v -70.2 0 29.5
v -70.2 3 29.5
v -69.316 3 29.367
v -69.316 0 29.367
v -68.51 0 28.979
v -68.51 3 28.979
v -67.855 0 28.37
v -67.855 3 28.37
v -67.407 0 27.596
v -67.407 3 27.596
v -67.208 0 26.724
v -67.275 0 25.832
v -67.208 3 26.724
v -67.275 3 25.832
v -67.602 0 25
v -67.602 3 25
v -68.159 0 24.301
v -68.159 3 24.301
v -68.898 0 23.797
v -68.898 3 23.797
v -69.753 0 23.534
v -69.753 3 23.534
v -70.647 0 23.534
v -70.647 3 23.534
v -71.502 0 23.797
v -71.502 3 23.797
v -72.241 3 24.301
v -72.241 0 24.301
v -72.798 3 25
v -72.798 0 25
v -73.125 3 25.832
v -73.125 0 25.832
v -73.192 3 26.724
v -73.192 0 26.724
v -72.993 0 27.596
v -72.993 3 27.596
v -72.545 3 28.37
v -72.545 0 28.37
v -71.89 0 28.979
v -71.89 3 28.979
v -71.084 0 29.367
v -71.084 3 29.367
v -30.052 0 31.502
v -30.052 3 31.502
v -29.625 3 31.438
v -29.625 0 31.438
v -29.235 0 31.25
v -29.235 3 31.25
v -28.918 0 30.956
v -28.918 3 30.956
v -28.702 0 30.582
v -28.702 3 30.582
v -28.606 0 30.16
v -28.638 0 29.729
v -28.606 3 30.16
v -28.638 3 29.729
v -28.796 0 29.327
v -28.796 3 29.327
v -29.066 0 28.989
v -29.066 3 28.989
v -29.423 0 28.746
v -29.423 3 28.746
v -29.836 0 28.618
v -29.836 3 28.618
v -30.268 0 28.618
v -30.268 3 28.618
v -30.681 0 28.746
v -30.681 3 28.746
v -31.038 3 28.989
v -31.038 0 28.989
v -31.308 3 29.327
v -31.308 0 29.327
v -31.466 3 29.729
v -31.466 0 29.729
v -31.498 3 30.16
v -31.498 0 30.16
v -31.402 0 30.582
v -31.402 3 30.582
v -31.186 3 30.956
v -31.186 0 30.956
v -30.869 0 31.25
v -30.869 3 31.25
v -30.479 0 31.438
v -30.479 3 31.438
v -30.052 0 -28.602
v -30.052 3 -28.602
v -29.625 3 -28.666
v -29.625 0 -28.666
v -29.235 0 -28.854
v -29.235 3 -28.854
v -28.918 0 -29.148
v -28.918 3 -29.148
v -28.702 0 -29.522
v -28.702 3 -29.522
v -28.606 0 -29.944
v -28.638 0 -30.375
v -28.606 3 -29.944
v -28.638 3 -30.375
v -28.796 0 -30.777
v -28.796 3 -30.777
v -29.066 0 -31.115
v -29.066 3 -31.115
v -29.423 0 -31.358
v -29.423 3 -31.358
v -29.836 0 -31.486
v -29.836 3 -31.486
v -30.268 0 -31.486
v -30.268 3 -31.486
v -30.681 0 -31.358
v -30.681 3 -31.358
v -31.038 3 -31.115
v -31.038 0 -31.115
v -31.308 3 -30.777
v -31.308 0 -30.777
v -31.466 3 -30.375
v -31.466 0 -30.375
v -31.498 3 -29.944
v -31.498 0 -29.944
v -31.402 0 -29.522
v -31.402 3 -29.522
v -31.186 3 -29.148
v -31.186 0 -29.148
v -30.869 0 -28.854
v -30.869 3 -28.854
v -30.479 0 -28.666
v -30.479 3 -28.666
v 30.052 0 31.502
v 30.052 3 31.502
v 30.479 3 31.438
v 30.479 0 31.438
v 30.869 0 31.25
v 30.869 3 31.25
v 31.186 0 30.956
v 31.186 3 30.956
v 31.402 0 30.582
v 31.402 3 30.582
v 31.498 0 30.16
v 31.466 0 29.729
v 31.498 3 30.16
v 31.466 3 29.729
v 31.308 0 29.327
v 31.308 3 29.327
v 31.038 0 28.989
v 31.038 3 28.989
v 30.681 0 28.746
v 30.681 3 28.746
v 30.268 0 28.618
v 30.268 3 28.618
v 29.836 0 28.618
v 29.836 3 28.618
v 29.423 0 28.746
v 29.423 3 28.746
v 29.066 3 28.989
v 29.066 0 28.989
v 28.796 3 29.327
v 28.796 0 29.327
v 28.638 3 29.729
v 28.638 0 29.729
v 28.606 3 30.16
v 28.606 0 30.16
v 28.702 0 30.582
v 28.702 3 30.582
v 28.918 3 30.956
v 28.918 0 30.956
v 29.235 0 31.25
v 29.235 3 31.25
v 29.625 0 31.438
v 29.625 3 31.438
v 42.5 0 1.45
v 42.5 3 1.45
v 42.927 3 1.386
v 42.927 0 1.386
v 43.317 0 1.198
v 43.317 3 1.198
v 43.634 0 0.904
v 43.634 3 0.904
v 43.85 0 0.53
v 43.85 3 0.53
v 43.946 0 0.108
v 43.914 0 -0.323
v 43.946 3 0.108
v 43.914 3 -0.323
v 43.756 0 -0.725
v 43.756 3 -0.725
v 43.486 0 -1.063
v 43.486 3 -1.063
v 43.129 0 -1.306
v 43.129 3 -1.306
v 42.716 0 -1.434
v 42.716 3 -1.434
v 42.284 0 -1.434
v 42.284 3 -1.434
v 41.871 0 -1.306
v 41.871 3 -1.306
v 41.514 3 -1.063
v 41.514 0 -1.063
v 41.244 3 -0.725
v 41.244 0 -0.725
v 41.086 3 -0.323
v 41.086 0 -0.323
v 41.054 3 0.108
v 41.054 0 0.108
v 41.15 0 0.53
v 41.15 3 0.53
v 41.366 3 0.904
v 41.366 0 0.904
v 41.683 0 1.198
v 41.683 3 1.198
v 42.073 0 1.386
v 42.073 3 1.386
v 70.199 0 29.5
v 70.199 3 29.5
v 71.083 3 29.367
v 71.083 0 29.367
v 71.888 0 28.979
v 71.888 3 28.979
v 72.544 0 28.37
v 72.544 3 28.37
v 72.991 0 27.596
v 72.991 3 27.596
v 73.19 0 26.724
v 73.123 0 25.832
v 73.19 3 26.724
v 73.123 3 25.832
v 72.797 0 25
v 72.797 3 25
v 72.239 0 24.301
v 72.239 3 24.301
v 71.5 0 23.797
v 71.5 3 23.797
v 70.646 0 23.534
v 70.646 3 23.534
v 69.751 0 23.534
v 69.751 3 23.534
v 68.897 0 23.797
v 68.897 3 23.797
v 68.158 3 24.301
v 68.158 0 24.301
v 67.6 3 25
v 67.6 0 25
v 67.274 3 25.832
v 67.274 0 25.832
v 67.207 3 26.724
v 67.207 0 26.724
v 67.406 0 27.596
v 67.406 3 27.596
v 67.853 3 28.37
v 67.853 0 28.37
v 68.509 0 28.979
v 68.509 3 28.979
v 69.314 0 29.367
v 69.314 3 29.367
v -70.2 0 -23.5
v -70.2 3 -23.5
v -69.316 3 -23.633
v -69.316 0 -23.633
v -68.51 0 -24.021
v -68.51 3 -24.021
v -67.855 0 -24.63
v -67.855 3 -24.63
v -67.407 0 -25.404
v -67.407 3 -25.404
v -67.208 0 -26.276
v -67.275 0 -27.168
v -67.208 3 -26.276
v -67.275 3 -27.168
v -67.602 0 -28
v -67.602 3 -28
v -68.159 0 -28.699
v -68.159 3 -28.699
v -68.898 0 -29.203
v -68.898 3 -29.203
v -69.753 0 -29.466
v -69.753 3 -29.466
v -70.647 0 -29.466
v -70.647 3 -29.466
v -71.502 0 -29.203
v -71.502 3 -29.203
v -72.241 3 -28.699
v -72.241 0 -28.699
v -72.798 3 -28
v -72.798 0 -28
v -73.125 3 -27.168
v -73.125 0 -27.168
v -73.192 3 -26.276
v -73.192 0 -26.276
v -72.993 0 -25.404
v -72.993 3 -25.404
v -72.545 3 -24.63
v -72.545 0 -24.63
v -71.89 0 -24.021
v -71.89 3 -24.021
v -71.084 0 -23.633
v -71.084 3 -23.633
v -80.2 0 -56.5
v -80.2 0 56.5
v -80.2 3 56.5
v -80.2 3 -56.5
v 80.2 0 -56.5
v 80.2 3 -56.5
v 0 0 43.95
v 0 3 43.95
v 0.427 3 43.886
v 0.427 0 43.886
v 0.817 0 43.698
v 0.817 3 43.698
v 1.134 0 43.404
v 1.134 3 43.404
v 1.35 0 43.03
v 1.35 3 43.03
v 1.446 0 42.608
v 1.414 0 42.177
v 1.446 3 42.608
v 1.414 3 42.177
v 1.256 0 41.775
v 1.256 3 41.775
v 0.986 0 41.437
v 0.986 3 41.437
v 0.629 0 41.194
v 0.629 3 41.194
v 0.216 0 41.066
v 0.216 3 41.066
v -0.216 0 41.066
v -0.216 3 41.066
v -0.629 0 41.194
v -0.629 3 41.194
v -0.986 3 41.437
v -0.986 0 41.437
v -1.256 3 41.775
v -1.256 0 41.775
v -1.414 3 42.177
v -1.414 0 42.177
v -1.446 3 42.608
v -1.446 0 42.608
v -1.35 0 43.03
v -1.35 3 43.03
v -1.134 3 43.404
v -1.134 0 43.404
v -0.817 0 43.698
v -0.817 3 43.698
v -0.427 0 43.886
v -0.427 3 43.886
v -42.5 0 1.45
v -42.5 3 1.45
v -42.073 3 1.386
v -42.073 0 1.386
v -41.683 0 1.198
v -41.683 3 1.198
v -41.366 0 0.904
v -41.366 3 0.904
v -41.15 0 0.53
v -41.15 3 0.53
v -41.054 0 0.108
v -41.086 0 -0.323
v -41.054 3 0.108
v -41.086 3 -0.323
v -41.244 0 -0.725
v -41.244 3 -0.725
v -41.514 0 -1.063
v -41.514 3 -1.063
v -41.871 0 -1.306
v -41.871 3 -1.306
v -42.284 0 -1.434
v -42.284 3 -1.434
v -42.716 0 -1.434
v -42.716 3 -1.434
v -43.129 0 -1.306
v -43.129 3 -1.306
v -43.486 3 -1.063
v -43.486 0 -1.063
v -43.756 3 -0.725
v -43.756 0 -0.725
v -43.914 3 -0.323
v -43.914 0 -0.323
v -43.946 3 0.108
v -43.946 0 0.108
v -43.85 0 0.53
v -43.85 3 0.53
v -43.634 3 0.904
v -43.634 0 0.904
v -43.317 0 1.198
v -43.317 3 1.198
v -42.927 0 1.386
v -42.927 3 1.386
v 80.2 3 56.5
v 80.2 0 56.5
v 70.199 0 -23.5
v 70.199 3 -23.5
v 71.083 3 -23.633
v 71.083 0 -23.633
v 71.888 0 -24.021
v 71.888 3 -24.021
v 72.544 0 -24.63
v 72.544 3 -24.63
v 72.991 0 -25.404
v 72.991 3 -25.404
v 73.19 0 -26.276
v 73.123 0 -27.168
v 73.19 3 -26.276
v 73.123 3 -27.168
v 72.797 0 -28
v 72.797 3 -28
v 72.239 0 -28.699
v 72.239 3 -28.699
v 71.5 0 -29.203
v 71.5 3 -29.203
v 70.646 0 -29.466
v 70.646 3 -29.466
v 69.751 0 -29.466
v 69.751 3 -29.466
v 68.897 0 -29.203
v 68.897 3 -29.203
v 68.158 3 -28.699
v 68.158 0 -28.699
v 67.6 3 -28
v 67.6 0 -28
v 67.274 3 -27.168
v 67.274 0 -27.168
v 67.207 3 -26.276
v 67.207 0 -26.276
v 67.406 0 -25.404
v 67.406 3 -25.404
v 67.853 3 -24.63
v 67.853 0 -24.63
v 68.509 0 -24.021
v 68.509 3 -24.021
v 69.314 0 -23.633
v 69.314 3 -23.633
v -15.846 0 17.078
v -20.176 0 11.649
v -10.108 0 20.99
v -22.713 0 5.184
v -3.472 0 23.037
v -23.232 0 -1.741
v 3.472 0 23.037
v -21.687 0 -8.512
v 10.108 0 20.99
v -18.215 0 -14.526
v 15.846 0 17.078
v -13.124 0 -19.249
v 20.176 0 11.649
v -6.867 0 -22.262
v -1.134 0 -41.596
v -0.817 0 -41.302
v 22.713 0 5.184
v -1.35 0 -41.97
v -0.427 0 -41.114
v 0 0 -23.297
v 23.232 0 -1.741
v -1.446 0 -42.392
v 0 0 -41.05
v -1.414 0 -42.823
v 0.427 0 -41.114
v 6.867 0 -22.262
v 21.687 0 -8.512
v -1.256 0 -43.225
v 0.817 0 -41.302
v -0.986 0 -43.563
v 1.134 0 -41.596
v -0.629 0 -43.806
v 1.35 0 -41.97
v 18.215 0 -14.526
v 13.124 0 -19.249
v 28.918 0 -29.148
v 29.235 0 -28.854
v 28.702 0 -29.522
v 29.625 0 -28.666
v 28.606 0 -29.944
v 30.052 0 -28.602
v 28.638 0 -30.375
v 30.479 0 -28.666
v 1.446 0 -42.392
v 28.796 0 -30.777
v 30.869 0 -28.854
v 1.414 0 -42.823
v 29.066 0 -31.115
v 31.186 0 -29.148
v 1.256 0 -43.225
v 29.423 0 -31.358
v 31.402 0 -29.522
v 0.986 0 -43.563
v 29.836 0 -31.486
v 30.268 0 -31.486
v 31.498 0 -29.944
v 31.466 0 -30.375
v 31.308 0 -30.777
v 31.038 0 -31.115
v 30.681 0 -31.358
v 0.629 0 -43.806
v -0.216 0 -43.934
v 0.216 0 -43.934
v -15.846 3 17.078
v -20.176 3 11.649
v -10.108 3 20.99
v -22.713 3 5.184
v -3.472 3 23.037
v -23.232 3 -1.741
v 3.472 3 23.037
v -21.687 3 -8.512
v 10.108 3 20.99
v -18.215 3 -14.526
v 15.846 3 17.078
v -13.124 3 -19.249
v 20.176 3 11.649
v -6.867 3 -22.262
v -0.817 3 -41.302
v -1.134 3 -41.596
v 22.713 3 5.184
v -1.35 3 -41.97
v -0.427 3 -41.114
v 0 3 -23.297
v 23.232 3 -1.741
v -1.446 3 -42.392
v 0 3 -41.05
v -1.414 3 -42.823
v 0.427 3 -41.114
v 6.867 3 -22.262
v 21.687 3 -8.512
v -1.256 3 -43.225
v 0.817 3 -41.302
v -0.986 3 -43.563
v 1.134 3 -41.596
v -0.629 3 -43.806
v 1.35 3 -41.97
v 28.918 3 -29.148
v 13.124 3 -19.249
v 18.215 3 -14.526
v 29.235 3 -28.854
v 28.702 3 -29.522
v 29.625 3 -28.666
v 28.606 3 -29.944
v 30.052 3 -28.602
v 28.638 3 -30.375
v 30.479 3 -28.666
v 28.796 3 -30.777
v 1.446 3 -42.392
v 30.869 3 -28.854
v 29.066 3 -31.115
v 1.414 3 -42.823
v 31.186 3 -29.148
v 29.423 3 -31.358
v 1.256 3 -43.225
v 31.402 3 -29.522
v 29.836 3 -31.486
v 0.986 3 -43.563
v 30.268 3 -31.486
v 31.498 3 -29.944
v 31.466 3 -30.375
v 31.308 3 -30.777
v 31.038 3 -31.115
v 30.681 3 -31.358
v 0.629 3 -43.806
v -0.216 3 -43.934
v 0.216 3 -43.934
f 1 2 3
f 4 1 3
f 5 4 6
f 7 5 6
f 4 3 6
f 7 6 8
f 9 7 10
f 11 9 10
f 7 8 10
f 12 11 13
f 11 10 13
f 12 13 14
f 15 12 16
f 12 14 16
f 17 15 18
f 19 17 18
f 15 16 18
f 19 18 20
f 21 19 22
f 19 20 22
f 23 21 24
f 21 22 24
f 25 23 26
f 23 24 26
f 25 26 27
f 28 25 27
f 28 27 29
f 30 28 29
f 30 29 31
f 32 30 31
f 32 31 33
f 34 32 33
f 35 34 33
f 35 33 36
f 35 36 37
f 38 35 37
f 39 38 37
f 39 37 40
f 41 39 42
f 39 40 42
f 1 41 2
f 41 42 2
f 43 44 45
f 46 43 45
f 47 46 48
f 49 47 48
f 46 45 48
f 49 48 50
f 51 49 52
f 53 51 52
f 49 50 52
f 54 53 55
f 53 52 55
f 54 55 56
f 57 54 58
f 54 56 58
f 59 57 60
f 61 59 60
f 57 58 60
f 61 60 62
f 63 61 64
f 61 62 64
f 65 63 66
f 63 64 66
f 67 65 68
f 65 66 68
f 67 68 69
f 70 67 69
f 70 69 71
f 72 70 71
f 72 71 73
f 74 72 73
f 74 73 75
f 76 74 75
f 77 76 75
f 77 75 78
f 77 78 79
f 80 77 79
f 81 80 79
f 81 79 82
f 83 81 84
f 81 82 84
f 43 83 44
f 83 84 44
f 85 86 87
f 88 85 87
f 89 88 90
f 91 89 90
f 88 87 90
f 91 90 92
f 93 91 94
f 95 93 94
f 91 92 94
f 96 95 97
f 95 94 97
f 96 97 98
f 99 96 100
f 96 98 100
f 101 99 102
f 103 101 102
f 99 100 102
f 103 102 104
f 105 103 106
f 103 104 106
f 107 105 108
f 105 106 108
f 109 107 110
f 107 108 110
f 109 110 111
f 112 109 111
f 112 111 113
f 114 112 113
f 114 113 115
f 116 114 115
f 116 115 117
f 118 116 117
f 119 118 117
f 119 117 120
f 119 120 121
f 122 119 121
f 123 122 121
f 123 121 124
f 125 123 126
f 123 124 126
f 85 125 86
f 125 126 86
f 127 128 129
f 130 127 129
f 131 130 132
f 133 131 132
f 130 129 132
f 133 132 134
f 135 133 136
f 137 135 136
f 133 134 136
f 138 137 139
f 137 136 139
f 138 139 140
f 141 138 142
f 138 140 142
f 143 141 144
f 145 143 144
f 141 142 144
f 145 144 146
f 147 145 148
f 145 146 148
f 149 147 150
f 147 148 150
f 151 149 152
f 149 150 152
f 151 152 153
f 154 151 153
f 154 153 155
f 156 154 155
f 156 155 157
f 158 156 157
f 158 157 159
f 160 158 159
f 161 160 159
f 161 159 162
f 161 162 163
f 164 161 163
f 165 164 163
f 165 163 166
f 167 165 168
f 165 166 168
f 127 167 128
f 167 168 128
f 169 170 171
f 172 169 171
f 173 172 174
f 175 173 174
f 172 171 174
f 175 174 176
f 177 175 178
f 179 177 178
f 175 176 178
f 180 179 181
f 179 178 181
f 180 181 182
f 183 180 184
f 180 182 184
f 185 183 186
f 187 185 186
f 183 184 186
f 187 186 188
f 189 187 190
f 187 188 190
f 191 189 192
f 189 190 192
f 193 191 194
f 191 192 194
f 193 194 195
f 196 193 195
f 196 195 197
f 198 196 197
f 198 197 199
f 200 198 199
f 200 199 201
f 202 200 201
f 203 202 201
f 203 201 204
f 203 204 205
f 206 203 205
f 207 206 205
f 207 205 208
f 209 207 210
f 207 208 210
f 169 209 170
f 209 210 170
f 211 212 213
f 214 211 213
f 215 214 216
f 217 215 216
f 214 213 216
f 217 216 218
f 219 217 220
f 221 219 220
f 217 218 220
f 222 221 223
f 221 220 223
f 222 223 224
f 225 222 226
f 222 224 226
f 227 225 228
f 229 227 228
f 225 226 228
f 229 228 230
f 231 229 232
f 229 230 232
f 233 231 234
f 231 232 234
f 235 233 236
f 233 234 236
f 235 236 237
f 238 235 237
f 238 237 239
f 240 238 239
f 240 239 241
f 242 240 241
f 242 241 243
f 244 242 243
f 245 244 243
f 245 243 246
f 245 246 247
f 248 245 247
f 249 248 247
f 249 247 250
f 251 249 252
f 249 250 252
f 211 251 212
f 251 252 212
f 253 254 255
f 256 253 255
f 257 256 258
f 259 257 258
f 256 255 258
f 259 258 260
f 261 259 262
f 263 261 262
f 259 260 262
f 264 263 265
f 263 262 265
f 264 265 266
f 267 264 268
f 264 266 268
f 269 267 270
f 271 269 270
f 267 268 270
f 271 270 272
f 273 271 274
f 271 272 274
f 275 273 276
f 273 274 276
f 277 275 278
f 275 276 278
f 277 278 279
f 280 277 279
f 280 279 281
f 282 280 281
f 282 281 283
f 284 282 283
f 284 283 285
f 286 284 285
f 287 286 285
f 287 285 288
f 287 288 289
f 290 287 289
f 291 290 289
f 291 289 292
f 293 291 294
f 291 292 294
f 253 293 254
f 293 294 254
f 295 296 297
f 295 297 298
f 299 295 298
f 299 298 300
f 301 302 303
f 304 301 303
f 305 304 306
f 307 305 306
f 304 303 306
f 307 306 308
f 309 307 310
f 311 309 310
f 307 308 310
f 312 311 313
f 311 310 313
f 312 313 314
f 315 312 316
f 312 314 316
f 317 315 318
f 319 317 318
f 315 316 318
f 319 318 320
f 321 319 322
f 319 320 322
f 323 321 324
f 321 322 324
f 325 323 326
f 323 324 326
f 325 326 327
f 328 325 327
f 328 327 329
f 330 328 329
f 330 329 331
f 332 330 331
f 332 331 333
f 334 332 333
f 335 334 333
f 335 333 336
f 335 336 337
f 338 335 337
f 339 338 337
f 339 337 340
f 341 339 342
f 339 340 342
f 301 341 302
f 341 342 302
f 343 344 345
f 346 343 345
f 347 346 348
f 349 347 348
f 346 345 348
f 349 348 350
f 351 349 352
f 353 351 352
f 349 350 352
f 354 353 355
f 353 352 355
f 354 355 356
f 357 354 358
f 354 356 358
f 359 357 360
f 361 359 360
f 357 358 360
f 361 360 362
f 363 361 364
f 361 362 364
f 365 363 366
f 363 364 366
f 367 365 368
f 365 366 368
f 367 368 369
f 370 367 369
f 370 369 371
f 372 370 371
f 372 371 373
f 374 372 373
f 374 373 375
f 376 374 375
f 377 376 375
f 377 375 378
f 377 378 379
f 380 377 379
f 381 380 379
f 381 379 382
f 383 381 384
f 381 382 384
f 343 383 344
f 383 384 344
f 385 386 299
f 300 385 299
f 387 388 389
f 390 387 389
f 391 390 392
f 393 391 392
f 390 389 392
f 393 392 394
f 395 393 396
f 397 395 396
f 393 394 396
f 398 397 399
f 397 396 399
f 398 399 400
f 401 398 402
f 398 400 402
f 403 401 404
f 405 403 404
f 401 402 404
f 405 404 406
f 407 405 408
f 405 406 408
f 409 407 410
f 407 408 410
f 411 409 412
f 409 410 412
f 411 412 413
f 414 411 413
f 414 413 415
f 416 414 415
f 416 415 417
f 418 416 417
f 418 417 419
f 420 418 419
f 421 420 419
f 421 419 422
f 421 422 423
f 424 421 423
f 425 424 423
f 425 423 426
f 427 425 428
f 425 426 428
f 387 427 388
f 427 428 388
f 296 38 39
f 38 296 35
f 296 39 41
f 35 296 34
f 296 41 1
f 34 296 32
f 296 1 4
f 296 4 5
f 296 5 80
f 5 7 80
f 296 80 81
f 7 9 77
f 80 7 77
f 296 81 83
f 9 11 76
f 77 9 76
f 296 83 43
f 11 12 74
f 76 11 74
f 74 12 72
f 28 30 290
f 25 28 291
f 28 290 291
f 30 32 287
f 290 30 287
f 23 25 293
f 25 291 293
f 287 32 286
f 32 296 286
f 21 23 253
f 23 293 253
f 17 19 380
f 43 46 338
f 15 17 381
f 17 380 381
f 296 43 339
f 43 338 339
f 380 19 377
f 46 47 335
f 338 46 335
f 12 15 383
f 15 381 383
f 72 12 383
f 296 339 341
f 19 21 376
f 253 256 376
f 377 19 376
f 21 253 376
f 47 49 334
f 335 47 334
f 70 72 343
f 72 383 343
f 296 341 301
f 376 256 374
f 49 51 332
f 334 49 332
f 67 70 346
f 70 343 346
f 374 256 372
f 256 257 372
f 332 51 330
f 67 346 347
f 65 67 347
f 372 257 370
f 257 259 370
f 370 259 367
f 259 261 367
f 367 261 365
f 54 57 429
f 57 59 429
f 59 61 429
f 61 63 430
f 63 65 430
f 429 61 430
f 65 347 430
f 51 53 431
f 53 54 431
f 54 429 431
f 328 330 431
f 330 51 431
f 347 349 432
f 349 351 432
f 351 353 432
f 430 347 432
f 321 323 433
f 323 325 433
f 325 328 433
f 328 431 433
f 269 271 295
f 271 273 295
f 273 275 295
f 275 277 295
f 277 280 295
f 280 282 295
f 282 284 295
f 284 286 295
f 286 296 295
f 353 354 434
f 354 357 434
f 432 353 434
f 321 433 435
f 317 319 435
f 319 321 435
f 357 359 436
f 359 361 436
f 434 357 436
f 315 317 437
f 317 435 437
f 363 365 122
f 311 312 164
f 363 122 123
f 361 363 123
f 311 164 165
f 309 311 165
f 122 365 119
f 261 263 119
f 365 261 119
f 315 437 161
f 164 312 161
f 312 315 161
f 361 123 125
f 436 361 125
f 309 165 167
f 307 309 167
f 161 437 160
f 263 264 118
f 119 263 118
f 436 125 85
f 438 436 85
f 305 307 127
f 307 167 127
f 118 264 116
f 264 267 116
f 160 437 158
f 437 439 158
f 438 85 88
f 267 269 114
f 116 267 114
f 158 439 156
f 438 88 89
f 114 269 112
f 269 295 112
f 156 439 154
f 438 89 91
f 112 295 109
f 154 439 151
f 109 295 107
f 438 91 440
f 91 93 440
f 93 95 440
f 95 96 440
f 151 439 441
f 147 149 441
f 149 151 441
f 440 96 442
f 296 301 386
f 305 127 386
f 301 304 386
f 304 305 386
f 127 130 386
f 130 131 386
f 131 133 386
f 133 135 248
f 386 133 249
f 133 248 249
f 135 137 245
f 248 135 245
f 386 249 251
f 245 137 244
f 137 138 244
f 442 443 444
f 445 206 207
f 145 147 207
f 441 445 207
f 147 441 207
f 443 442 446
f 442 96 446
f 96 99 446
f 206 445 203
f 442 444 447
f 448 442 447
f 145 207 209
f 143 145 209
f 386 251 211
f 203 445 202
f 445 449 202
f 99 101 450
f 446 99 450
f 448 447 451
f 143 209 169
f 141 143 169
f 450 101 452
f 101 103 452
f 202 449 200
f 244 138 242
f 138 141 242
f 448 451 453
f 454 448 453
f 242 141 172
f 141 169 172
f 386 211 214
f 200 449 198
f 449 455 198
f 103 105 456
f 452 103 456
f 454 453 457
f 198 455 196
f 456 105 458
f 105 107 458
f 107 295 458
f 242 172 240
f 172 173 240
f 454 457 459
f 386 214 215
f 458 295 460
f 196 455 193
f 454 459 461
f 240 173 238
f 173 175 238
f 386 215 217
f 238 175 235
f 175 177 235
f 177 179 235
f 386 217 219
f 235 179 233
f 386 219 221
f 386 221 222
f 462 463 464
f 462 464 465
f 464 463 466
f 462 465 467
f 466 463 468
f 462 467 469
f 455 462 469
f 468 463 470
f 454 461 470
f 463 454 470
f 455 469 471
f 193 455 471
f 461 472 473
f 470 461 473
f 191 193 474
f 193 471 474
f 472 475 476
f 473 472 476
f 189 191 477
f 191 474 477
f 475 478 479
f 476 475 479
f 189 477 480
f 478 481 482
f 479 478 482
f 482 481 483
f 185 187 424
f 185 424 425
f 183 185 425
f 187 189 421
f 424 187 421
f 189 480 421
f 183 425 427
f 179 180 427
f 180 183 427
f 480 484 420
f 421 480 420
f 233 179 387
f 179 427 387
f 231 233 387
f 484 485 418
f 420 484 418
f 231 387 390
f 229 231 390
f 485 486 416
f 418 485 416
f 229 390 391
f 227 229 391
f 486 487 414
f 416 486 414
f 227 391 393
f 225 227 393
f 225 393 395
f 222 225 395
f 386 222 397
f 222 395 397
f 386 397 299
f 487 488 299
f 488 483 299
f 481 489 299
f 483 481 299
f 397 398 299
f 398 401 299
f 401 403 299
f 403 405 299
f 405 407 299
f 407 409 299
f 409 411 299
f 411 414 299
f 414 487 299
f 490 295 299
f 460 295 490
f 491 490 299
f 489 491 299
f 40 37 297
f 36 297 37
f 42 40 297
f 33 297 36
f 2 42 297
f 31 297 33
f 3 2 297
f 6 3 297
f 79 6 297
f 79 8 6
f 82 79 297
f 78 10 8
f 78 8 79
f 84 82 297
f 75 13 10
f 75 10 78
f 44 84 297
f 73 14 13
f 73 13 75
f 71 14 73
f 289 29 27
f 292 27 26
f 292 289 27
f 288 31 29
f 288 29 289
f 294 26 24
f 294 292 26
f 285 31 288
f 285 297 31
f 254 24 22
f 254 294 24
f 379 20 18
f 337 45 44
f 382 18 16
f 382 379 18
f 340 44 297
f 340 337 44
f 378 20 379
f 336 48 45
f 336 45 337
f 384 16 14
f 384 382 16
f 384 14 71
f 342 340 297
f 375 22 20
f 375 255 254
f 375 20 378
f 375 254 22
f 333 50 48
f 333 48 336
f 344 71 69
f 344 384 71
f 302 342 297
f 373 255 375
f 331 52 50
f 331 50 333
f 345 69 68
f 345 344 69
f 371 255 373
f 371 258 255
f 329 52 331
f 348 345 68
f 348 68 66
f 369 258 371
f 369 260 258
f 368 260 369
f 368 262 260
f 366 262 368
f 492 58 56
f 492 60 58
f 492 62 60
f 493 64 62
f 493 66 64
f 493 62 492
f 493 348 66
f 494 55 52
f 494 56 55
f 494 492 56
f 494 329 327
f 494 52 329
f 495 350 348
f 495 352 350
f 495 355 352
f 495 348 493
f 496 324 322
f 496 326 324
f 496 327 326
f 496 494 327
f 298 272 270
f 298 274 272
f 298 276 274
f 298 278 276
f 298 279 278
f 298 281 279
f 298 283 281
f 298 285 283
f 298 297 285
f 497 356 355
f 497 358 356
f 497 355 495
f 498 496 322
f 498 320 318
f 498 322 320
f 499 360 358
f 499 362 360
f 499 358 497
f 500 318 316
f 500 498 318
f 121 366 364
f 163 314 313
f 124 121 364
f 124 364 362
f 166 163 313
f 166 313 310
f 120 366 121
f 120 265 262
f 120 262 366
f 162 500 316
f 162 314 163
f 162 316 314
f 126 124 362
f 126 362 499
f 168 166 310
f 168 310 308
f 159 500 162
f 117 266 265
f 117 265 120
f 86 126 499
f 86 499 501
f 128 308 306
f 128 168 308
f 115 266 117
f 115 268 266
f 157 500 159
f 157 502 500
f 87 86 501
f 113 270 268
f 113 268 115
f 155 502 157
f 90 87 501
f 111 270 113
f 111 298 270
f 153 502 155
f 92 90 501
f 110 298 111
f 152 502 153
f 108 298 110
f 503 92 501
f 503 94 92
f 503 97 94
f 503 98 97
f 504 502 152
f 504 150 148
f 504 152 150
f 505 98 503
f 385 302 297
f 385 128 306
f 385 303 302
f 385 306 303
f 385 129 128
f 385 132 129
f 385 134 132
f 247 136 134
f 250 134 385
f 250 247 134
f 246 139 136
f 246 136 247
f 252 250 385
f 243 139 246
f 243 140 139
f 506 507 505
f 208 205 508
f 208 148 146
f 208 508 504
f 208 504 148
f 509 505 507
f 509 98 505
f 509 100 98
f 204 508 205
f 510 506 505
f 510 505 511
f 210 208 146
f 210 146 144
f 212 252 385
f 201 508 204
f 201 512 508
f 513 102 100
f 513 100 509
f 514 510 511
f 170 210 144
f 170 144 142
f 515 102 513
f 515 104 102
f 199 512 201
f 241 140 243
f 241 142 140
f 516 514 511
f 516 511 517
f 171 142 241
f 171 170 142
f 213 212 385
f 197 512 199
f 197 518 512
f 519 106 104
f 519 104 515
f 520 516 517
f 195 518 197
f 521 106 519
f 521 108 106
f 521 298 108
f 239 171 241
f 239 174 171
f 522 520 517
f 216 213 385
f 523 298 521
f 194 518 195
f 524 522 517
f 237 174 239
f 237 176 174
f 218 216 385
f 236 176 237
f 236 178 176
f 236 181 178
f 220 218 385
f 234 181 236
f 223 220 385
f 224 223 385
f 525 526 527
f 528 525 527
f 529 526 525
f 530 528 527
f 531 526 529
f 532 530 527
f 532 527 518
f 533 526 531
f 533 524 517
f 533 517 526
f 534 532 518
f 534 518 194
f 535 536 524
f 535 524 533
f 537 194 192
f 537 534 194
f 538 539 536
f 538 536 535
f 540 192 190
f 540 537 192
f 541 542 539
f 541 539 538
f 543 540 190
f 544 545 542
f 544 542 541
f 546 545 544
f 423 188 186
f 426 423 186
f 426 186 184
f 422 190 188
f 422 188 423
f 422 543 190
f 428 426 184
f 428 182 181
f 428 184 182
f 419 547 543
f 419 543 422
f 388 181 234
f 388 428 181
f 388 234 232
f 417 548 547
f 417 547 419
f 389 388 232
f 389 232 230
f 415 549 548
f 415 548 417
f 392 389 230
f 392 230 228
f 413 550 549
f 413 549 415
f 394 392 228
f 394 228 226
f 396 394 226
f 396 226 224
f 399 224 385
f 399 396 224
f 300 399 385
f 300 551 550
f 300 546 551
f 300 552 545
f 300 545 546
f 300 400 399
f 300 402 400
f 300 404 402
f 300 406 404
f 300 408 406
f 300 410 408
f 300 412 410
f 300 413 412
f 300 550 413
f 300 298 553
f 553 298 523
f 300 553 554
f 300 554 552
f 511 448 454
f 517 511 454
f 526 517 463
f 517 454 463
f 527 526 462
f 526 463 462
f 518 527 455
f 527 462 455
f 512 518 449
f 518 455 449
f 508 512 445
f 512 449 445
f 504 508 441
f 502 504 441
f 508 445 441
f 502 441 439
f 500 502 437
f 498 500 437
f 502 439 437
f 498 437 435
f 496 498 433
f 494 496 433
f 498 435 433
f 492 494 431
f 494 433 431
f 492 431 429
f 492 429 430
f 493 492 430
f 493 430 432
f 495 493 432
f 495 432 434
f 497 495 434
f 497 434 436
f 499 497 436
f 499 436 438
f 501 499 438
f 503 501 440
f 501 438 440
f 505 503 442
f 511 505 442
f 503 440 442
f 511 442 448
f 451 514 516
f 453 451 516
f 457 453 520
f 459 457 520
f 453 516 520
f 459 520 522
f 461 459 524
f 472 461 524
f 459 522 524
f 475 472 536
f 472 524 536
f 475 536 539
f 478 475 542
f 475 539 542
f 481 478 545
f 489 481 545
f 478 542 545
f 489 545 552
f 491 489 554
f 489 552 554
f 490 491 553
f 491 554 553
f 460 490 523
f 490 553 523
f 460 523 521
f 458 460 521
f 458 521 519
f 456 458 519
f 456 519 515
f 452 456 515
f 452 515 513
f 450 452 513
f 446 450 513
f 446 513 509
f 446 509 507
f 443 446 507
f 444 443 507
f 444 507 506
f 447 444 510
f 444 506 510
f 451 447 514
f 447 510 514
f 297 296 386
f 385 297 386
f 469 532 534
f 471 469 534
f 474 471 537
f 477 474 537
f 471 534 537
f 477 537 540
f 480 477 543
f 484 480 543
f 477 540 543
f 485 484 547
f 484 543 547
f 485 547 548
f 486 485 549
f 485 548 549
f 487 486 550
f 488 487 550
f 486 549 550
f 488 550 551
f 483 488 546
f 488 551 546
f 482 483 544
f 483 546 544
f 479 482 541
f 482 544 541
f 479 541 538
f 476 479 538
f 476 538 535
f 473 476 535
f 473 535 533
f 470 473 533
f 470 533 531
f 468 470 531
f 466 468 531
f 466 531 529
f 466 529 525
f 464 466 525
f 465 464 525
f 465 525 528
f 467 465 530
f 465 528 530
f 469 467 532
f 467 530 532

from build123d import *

# Parameters (mm, degrees)
SKETCH_1_W          = 160.4
SKETCH_1_H          = 113
EXTRUDE_1_DEPTH     = 3
SKETCH_2_R          = 1.45
CUT_EXTRUDE_1_DEPTH = 3
SKETCH_3_R          = 23.297499696
CUT_EXTRUDE_2_DEPTH = 3
SKETCH_4_R          = 3
CUT_EXTRUDE_3_DEPTH = 3


with BuildPart() as part:
    # 草图1 → 凸台-拉伸1 (new body)
    with BuildSketch(Plane(origin=(0, 0, 0), x_dir=(1, 0, 0), z_dir=(0, 1, 0))):
        Rectangle(SKETCH_1_W, SKETCH_1_H)
    extrude(amount=EXTRUDE_1_DEPTH)

    # 草图2 → 切除-拉伸1 (cut)
    with BuildSketch(Plane(origin=(0, 3, 0), x_dir=(1, 0, 0), z_dir=(0, 1, 0))):
        with Locations(Location((0, -42.5, 0), (0, 0, 270))):
            Circle(SKETCH_2_R)
        with Locations(Location((-30.0520382, -30.0520382, 0), (0, 0, 270))):
            Circle(SKETCH_2_R)
        with Locations(Location((-42.5, 0, 0), (0, 0, 270))):
            Circle(SKETCH_2_R)
        with Locations(Location((-30.0520382, 30.0520382, 0), (0, 0, 270))):
            Circle(SKETCH_2_R)
        with Locations(Location((0, 42.5, 0), (0, 0, 270))):
            Circle(SKETCH_2_R)
        with Locations(Location((30.0520382, 30.0520382, 0), (0, 0, 270))):
            Circle(SKETCH_2_R)
        with Locations(Location((42.5, 0, 0), (0, 0, 270))):
            Circle(SKETCH_2_R)
        with Locations(Location((30.0520382, -30.0520382, 0), (0, 0, 270))):
            Circle(SKETCH_2_R)
    extrude(amount=-CUT_EXTRUDE_1_DEPTH, mode=Mode.SUBTRACT)

    # 草图3 → 切除-拉伸2 (cut)
    with BuildSketch(Plane.XZ):
        with Locations(Location((0, 0, 0), (0, 0, 270))):
            Circle(SKETCH_3_R)
    extrude(amount=-CUT_EXTRUDE_2_DEPTH, mode=Mode.SUBTRACT)

    # 草图4 → 切除-拉伸3 (cut)
    with BuildSketch(Plane(origin=(0, 3, 0), x_dir=(1, 0, 0), z_dir=(0, 1, 0))):
        with Locations(Location((70.198513237, -26.5, 0), (0, 0, 270))):
            Circle(SKETCH_4_R)
        with Locations(Location((-70.2, -26.5, 0), (0, 0, 270))):
            Circle(SKETCH_4_R)
        with Locations(Location((70.198513237, 26.5, 0), (0, 0, 270))):
            Circle(SKETCH_4_R)
        with Locations(Location((-70.2, 26.5, 0), (0, 0, 270))):
            Circle(SKETCH_4_R)
    extrude(amount=-CUT_EXTRUDE_3_DEPTH, mode=Mode.SUBTRACT)


solid = part.part
